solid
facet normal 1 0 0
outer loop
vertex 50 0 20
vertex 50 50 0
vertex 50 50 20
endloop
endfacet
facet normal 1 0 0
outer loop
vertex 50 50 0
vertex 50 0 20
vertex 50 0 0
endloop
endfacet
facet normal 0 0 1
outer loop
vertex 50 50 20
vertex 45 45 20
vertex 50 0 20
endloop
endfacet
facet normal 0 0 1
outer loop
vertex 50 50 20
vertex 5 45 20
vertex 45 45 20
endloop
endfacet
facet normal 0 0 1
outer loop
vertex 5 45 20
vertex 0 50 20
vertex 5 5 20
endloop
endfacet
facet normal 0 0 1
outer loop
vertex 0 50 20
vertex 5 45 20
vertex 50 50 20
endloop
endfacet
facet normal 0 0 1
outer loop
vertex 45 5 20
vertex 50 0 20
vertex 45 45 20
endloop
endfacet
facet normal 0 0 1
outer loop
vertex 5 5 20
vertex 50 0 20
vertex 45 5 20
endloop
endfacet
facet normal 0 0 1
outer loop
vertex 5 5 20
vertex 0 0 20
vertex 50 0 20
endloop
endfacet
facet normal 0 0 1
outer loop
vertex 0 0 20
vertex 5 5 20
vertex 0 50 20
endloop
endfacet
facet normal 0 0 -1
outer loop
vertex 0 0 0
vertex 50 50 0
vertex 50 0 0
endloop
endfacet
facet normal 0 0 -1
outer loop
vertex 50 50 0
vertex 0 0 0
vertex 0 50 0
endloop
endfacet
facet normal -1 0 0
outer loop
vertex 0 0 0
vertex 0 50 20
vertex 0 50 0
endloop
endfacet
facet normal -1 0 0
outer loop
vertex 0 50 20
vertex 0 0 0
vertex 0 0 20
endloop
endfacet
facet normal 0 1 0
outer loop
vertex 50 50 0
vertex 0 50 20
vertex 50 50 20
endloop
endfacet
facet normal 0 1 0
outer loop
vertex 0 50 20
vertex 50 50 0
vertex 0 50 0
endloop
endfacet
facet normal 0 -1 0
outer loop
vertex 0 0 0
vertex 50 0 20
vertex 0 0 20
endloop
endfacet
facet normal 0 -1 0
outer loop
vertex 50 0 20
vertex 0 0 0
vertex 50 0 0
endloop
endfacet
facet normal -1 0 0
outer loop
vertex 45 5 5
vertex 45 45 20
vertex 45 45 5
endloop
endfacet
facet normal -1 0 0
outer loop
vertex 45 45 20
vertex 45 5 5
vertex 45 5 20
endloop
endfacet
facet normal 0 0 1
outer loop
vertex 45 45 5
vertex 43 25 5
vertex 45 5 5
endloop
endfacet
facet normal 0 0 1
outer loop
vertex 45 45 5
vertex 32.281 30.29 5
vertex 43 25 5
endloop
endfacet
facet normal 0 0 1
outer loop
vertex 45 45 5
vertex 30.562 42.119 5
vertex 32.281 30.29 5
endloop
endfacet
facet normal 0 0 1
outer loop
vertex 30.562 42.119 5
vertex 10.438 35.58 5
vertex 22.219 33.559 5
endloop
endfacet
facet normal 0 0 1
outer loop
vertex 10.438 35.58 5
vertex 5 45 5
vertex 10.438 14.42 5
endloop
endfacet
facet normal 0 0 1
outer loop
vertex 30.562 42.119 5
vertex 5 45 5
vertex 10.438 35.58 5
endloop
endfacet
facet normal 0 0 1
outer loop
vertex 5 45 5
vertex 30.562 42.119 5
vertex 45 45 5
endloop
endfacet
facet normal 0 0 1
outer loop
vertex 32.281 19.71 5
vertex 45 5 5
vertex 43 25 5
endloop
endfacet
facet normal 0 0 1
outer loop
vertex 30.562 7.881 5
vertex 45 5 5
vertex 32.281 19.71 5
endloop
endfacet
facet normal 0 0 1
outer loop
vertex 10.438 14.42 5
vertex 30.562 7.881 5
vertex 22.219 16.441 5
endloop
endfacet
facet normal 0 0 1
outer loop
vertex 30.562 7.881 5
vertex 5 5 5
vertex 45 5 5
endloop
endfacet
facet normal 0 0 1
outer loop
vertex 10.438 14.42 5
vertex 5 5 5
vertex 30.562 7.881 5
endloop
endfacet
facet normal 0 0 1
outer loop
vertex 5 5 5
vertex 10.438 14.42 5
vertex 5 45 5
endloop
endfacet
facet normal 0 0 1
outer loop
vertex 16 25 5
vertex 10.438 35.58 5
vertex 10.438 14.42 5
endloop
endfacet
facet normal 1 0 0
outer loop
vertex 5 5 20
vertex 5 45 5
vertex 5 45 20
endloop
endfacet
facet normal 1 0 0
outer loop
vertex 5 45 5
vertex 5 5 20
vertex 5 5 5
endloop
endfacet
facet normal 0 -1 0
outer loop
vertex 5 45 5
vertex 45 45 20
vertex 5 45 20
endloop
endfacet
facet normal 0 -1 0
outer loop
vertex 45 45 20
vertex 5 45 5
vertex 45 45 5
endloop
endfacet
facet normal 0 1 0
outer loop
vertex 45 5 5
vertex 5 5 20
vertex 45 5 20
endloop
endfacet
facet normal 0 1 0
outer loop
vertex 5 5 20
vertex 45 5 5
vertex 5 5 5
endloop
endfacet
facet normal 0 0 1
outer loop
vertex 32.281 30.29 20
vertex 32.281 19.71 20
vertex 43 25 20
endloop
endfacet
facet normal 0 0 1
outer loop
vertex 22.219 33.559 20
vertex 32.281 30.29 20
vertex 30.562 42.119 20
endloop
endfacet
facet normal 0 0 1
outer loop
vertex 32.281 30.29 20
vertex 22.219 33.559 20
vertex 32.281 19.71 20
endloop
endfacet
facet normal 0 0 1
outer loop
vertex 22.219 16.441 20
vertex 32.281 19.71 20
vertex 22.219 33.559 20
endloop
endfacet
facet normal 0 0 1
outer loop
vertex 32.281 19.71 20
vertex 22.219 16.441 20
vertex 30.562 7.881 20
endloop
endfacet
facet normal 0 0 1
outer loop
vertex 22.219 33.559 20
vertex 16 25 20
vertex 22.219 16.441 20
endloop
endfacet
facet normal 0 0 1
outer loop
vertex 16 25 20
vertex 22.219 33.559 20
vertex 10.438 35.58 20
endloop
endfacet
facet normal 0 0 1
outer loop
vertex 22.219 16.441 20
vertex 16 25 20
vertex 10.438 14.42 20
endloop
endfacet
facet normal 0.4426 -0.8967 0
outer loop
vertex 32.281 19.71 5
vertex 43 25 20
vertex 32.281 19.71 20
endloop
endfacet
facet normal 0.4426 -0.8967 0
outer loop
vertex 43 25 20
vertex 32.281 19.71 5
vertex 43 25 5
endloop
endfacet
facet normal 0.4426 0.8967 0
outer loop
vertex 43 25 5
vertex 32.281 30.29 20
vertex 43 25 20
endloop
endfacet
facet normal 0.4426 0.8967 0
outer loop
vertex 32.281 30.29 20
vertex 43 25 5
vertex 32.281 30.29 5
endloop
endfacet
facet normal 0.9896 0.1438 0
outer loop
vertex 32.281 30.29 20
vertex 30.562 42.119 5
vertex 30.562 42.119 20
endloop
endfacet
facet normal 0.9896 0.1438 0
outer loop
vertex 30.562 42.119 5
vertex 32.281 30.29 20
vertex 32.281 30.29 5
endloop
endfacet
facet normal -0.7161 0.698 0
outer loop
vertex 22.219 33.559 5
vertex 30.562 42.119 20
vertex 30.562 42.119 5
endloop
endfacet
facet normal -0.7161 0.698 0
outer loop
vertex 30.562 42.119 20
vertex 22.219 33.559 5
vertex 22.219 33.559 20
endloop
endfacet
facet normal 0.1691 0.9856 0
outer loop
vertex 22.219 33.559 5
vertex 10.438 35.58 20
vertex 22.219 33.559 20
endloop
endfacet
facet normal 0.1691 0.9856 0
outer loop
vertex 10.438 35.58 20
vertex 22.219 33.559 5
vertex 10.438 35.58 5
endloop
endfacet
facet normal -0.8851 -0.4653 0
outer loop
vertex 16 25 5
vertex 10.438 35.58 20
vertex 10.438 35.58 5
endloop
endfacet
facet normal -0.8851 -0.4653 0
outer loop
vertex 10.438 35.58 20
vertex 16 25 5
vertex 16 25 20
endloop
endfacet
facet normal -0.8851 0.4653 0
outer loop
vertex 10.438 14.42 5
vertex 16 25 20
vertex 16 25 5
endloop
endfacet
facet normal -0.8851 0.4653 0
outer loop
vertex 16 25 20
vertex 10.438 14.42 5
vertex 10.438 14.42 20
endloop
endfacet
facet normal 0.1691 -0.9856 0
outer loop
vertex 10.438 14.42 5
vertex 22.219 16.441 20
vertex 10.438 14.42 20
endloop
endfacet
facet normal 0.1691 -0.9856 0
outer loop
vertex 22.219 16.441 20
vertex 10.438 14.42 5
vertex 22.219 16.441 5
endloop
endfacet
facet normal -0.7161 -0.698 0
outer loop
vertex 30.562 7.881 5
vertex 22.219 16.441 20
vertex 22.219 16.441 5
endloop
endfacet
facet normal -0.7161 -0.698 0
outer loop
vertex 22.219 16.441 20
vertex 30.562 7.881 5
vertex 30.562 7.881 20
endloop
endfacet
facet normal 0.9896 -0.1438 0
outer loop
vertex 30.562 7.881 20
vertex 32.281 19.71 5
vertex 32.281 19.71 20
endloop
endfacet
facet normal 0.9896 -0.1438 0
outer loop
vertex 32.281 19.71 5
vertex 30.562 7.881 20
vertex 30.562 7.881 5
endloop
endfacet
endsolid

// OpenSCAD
// Star Mold Creator Design
// Creates a design that can be used to make star molds
// All dimensions in millimeters

// Basic parameters
base_width = 40;     // 4 cm in mm
base_length = 40;    // 4 cm in mm
star_depth = 15;     // 3 cm in mm
wall_thickness = 5;  // 5 mm walls

// Star parameters
outer_radius = 18;   // Outer points of the star (increased size)
inner_radius = 9;    // Inner points of the star
num_points = 5;      // Number of points on the star

// Calculated dimensions
outer_width = base_width + 2*wall_thickness;
outer_length = base_length + 2*wall_thickness;
outer_height = star_depth + wall_thickness;

// Create a 2D star polygon
module star_2d(outer_r, inner_r, points) {
    angles = [for (i = [0:2*points-1]) i * 180 / points];
    radii = [for (i = [0:2*points-1]) i % 2 == 0 ? outer_r : inner_r];
    
    polygon([
        for (i = [0:2*points-1])
            [radii[i] * cos(angles[i]), radii[i] * sin(angles[i])]
    ]);
}

// Main design - a star-shaped protrusion on a base with containing walls
union() {
    // Base plate
    cube([outer_width, outer_length, wall_thickness]);
    
    // Star protrusion
    translate([outer_width/2, outer_length/2, wall_thickness])
        linear_extrude(height = star_depth)
            star_2d(outer_radius, inner_radius, num_points);
    
    // Containing walls around the edge of the base
    difference() {
        // Outer wall cube
        cube([outer_width, outer_length, wall_thickness + 15]);
        
        // Inner cutout
        translate([wall_thickness, wall_thickness, wall_thickness])
            cube([base_width, base_length, 20]);
    }
}
